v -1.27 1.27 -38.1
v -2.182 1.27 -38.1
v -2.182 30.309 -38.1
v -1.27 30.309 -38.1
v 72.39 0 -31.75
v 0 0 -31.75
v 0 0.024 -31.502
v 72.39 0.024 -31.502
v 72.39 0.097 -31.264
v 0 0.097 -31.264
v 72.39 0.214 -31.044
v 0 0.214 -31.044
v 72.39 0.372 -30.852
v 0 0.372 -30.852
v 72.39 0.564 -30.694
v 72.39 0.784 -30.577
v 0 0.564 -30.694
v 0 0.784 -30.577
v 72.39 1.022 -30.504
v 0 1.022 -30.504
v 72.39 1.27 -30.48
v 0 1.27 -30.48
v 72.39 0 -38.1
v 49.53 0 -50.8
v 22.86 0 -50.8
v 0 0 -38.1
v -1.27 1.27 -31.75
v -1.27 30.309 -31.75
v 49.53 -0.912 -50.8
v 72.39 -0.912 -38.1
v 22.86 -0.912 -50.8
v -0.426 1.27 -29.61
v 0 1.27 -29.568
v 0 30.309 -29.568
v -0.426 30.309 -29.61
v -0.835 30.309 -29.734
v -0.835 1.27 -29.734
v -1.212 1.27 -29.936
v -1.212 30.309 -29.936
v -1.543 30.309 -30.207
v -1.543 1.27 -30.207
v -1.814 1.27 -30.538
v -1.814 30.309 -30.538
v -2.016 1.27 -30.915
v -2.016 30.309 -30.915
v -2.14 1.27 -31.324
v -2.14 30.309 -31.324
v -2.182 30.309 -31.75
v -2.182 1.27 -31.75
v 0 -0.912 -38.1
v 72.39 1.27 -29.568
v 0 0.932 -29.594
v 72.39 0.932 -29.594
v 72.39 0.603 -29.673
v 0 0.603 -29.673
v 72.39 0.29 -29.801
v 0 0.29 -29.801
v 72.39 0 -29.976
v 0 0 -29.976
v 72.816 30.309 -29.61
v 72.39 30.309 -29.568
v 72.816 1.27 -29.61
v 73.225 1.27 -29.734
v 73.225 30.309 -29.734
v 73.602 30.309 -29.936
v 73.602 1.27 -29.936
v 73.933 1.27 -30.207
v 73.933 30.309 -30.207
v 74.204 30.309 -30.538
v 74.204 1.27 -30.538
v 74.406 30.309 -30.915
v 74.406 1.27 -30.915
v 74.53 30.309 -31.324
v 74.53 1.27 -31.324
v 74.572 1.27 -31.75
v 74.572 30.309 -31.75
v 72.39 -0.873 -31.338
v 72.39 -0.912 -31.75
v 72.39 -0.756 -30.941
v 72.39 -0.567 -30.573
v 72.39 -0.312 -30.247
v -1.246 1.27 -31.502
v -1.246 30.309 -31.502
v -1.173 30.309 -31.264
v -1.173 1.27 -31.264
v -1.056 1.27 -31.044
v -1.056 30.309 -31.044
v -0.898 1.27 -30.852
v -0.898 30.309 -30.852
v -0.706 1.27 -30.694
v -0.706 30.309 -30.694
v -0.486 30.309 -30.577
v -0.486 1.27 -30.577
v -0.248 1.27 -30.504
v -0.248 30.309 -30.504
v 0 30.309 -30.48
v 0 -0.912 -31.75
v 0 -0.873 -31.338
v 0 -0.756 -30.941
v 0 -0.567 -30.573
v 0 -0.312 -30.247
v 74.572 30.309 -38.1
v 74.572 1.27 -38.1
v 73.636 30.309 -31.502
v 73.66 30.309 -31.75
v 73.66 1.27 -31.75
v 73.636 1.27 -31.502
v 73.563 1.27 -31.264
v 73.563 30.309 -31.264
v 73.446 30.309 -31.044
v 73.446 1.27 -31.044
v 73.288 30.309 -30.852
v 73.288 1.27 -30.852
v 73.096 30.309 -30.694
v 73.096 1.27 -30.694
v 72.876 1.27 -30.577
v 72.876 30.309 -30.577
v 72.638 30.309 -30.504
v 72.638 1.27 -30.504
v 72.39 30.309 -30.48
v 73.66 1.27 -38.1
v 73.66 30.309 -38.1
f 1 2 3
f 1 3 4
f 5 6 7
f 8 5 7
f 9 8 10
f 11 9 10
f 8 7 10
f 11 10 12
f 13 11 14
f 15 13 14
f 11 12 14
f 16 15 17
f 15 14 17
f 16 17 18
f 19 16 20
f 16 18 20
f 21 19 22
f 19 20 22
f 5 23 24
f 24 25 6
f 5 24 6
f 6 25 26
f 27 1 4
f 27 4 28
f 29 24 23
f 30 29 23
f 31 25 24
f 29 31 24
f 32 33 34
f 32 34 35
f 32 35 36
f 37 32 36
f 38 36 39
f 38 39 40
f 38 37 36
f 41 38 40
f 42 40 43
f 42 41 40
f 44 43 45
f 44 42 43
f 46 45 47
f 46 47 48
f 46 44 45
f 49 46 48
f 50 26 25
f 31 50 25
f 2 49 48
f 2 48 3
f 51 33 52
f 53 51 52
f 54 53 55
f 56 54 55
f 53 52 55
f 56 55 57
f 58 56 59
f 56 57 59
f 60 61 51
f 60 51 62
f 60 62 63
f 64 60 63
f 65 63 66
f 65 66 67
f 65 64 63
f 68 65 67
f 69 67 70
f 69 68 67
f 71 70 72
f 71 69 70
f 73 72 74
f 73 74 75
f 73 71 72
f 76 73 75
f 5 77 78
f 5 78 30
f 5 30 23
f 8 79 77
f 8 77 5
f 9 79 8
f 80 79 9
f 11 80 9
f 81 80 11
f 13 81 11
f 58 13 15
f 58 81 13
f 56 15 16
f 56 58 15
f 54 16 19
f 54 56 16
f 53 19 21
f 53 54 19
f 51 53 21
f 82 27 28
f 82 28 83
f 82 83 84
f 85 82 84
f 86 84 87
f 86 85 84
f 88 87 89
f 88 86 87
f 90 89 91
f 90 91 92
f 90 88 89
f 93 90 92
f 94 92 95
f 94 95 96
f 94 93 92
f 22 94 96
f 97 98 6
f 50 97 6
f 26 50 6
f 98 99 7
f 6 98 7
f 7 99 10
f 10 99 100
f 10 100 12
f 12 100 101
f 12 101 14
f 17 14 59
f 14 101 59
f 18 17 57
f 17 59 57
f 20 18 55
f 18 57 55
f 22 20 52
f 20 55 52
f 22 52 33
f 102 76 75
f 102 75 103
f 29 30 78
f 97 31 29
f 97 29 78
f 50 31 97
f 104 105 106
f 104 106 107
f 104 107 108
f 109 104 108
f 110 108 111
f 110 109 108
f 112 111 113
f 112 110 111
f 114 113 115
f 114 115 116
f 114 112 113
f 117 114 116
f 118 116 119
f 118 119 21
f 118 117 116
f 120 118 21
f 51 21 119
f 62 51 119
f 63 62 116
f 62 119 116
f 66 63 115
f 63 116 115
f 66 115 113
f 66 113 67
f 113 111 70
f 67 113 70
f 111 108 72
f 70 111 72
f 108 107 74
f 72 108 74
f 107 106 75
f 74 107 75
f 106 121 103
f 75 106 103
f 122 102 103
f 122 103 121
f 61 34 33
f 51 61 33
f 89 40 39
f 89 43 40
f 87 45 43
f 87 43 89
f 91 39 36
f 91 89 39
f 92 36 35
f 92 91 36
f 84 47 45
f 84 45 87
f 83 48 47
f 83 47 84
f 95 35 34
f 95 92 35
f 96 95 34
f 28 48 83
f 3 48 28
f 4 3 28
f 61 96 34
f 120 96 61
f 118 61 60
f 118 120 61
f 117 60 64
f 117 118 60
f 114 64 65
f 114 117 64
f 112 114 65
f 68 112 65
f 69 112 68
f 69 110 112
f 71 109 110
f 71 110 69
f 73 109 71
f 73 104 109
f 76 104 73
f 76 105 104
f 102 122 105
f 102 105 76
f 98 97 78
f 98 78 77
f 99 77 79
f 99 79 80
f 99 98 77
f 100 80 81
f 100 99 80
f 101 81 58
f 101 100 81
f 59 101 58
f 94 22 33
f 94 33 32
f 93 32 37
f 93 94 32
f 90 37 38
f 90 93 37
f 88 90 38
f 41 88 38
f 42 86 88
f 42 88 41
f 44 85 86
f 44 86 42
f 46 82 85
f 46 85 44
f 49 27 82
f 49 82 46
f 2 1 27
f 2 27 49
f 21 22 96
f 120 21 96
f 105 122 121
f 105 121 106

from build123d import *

# Parameters (mm, degrees)
BASE_FLANGE1_DEPTH     = 0.91186
SKETCHED_BEND1_DEPTH   = 72.39
SKETCHED_BEND1_2_DEPTH = 72.39
EDGE_FLANGE1_DEPTH     = 29.038915496
EDGE_FLANGE2_DEPTH     = 29.038915496


# Read off the part's stored shape, not the designer's step: Sketched Bend1
# Sheet-metal steps are written as plain solids
with BuildPart() as part:
    # Sketch1 → Base-Flange1 (new body)
    with BuildSketch(Plane(origin=(0, 0, 0), x_dir=(1, 0, 0), z_dir=(0, 1, 0))):
        Polygon((0, 38.1), (22.86, 50.8), (49.53, 50.8), (72.39, 38.1), (72.39, 0), (0, 0), align=None)
    extrude(amount=-BASE_FLANGE1_DEPTH)

    # Sketched Bend1 outline → Sketched Bend1 (cut)
    with BuildSketch(Plane.YZ):
        with BuildLine():
            ThreePointArc((-0.91186, -31.75), (-0.670550858, -30.752615706), (0, -29.975848636))
            Line((0, -29.975848636), (0, 0))
            Line((0, 0), (-0.91186, 0))
            Line((-0.91186, 0), (-0.91186, -31.75))
        make_face()
    extrude(amount=SKETCHED_BEND1_DEPTH, mode=Mode.SUBTRACT)

    # Sketched Bend1 2 outline → Sketched Bend1 2 (add)
    with BuildSketch(Plane.YZ):
        with BuildLine():
            Line((30.308915496, -30.48), (30.308915496, -29.56814))
            Line((30.308915496, -29.56814), (1.27, -29.56814))
            ThreePointArc((1.27, -29.56814), (0.603080527, -29.672566131), (0, -29.975848636))
            Line((0, -29.975848636), (0, -31.75))
            ThreePointArc((0, -31.75), (0.371974388, -30.851974388), (1.27, -30.48))
            Line((1.27, -30.48), (30.308915496, -30.48))
        make_face()
    extrude(amount=SKETCHED_BEND1_2_DEPTH)

    # Edge-Flange1 section (across the edge) → Edge-Flange1 (add)
    with BuildSketch(Plane(origin=(-1.27, 1.27, -30.48), x_dir=(1, 0, 0), z_dir=(0, 1, 0))):
        with BuildLine():
            Line((-0.91186, 1.27), (-0.91186, 7.62))
            Line((-0.91186, 7.62), (0, 7.62))
            Line((0, 7.62), (0, 1.27))
            ThreePointArc((0, 1.27), (0.371974388, 0.371974388), (1.27, 0))
            Line((1.27, 0), (1.27, -0.91186))
            ThreePointArc((1.27, -0.91186), (-0.272808002, -0.272808002), (-0.91186, 1.27))
        make_face()
    extrude(amount=EDGE_FLANGE1_DEPTH)

    # Edge-Flange2 section (across the edge) → Edge-Flange2 (add)
    with BuildSketch(Plane(origin=(73.66, 30.308915496, -30.48), x_dir=(-1, 0, 0), z_dir=(0, -1, 0))):
        with BuildLine():
            Line((-0.91186, 1.27), (-0.91186, 7.62))
            Line((-0.91186, 7.62), (0, 7.62))
            Line((0, 7.62), (0, 1.27))
            ThreePointArc((0, 1.27), (0.371974388, 0.371974388), (1.27, 0))
            Line((1.27, 0), (1.27, -0.91186))
            ThreePointArc((1.27, -0.91186), (-0.272808002, -0.272808002), (-0.91186, 1.27))
        make_face()
    extrude(amount=EDGE_FLANGE2_DEPTH)


solid = part.part
